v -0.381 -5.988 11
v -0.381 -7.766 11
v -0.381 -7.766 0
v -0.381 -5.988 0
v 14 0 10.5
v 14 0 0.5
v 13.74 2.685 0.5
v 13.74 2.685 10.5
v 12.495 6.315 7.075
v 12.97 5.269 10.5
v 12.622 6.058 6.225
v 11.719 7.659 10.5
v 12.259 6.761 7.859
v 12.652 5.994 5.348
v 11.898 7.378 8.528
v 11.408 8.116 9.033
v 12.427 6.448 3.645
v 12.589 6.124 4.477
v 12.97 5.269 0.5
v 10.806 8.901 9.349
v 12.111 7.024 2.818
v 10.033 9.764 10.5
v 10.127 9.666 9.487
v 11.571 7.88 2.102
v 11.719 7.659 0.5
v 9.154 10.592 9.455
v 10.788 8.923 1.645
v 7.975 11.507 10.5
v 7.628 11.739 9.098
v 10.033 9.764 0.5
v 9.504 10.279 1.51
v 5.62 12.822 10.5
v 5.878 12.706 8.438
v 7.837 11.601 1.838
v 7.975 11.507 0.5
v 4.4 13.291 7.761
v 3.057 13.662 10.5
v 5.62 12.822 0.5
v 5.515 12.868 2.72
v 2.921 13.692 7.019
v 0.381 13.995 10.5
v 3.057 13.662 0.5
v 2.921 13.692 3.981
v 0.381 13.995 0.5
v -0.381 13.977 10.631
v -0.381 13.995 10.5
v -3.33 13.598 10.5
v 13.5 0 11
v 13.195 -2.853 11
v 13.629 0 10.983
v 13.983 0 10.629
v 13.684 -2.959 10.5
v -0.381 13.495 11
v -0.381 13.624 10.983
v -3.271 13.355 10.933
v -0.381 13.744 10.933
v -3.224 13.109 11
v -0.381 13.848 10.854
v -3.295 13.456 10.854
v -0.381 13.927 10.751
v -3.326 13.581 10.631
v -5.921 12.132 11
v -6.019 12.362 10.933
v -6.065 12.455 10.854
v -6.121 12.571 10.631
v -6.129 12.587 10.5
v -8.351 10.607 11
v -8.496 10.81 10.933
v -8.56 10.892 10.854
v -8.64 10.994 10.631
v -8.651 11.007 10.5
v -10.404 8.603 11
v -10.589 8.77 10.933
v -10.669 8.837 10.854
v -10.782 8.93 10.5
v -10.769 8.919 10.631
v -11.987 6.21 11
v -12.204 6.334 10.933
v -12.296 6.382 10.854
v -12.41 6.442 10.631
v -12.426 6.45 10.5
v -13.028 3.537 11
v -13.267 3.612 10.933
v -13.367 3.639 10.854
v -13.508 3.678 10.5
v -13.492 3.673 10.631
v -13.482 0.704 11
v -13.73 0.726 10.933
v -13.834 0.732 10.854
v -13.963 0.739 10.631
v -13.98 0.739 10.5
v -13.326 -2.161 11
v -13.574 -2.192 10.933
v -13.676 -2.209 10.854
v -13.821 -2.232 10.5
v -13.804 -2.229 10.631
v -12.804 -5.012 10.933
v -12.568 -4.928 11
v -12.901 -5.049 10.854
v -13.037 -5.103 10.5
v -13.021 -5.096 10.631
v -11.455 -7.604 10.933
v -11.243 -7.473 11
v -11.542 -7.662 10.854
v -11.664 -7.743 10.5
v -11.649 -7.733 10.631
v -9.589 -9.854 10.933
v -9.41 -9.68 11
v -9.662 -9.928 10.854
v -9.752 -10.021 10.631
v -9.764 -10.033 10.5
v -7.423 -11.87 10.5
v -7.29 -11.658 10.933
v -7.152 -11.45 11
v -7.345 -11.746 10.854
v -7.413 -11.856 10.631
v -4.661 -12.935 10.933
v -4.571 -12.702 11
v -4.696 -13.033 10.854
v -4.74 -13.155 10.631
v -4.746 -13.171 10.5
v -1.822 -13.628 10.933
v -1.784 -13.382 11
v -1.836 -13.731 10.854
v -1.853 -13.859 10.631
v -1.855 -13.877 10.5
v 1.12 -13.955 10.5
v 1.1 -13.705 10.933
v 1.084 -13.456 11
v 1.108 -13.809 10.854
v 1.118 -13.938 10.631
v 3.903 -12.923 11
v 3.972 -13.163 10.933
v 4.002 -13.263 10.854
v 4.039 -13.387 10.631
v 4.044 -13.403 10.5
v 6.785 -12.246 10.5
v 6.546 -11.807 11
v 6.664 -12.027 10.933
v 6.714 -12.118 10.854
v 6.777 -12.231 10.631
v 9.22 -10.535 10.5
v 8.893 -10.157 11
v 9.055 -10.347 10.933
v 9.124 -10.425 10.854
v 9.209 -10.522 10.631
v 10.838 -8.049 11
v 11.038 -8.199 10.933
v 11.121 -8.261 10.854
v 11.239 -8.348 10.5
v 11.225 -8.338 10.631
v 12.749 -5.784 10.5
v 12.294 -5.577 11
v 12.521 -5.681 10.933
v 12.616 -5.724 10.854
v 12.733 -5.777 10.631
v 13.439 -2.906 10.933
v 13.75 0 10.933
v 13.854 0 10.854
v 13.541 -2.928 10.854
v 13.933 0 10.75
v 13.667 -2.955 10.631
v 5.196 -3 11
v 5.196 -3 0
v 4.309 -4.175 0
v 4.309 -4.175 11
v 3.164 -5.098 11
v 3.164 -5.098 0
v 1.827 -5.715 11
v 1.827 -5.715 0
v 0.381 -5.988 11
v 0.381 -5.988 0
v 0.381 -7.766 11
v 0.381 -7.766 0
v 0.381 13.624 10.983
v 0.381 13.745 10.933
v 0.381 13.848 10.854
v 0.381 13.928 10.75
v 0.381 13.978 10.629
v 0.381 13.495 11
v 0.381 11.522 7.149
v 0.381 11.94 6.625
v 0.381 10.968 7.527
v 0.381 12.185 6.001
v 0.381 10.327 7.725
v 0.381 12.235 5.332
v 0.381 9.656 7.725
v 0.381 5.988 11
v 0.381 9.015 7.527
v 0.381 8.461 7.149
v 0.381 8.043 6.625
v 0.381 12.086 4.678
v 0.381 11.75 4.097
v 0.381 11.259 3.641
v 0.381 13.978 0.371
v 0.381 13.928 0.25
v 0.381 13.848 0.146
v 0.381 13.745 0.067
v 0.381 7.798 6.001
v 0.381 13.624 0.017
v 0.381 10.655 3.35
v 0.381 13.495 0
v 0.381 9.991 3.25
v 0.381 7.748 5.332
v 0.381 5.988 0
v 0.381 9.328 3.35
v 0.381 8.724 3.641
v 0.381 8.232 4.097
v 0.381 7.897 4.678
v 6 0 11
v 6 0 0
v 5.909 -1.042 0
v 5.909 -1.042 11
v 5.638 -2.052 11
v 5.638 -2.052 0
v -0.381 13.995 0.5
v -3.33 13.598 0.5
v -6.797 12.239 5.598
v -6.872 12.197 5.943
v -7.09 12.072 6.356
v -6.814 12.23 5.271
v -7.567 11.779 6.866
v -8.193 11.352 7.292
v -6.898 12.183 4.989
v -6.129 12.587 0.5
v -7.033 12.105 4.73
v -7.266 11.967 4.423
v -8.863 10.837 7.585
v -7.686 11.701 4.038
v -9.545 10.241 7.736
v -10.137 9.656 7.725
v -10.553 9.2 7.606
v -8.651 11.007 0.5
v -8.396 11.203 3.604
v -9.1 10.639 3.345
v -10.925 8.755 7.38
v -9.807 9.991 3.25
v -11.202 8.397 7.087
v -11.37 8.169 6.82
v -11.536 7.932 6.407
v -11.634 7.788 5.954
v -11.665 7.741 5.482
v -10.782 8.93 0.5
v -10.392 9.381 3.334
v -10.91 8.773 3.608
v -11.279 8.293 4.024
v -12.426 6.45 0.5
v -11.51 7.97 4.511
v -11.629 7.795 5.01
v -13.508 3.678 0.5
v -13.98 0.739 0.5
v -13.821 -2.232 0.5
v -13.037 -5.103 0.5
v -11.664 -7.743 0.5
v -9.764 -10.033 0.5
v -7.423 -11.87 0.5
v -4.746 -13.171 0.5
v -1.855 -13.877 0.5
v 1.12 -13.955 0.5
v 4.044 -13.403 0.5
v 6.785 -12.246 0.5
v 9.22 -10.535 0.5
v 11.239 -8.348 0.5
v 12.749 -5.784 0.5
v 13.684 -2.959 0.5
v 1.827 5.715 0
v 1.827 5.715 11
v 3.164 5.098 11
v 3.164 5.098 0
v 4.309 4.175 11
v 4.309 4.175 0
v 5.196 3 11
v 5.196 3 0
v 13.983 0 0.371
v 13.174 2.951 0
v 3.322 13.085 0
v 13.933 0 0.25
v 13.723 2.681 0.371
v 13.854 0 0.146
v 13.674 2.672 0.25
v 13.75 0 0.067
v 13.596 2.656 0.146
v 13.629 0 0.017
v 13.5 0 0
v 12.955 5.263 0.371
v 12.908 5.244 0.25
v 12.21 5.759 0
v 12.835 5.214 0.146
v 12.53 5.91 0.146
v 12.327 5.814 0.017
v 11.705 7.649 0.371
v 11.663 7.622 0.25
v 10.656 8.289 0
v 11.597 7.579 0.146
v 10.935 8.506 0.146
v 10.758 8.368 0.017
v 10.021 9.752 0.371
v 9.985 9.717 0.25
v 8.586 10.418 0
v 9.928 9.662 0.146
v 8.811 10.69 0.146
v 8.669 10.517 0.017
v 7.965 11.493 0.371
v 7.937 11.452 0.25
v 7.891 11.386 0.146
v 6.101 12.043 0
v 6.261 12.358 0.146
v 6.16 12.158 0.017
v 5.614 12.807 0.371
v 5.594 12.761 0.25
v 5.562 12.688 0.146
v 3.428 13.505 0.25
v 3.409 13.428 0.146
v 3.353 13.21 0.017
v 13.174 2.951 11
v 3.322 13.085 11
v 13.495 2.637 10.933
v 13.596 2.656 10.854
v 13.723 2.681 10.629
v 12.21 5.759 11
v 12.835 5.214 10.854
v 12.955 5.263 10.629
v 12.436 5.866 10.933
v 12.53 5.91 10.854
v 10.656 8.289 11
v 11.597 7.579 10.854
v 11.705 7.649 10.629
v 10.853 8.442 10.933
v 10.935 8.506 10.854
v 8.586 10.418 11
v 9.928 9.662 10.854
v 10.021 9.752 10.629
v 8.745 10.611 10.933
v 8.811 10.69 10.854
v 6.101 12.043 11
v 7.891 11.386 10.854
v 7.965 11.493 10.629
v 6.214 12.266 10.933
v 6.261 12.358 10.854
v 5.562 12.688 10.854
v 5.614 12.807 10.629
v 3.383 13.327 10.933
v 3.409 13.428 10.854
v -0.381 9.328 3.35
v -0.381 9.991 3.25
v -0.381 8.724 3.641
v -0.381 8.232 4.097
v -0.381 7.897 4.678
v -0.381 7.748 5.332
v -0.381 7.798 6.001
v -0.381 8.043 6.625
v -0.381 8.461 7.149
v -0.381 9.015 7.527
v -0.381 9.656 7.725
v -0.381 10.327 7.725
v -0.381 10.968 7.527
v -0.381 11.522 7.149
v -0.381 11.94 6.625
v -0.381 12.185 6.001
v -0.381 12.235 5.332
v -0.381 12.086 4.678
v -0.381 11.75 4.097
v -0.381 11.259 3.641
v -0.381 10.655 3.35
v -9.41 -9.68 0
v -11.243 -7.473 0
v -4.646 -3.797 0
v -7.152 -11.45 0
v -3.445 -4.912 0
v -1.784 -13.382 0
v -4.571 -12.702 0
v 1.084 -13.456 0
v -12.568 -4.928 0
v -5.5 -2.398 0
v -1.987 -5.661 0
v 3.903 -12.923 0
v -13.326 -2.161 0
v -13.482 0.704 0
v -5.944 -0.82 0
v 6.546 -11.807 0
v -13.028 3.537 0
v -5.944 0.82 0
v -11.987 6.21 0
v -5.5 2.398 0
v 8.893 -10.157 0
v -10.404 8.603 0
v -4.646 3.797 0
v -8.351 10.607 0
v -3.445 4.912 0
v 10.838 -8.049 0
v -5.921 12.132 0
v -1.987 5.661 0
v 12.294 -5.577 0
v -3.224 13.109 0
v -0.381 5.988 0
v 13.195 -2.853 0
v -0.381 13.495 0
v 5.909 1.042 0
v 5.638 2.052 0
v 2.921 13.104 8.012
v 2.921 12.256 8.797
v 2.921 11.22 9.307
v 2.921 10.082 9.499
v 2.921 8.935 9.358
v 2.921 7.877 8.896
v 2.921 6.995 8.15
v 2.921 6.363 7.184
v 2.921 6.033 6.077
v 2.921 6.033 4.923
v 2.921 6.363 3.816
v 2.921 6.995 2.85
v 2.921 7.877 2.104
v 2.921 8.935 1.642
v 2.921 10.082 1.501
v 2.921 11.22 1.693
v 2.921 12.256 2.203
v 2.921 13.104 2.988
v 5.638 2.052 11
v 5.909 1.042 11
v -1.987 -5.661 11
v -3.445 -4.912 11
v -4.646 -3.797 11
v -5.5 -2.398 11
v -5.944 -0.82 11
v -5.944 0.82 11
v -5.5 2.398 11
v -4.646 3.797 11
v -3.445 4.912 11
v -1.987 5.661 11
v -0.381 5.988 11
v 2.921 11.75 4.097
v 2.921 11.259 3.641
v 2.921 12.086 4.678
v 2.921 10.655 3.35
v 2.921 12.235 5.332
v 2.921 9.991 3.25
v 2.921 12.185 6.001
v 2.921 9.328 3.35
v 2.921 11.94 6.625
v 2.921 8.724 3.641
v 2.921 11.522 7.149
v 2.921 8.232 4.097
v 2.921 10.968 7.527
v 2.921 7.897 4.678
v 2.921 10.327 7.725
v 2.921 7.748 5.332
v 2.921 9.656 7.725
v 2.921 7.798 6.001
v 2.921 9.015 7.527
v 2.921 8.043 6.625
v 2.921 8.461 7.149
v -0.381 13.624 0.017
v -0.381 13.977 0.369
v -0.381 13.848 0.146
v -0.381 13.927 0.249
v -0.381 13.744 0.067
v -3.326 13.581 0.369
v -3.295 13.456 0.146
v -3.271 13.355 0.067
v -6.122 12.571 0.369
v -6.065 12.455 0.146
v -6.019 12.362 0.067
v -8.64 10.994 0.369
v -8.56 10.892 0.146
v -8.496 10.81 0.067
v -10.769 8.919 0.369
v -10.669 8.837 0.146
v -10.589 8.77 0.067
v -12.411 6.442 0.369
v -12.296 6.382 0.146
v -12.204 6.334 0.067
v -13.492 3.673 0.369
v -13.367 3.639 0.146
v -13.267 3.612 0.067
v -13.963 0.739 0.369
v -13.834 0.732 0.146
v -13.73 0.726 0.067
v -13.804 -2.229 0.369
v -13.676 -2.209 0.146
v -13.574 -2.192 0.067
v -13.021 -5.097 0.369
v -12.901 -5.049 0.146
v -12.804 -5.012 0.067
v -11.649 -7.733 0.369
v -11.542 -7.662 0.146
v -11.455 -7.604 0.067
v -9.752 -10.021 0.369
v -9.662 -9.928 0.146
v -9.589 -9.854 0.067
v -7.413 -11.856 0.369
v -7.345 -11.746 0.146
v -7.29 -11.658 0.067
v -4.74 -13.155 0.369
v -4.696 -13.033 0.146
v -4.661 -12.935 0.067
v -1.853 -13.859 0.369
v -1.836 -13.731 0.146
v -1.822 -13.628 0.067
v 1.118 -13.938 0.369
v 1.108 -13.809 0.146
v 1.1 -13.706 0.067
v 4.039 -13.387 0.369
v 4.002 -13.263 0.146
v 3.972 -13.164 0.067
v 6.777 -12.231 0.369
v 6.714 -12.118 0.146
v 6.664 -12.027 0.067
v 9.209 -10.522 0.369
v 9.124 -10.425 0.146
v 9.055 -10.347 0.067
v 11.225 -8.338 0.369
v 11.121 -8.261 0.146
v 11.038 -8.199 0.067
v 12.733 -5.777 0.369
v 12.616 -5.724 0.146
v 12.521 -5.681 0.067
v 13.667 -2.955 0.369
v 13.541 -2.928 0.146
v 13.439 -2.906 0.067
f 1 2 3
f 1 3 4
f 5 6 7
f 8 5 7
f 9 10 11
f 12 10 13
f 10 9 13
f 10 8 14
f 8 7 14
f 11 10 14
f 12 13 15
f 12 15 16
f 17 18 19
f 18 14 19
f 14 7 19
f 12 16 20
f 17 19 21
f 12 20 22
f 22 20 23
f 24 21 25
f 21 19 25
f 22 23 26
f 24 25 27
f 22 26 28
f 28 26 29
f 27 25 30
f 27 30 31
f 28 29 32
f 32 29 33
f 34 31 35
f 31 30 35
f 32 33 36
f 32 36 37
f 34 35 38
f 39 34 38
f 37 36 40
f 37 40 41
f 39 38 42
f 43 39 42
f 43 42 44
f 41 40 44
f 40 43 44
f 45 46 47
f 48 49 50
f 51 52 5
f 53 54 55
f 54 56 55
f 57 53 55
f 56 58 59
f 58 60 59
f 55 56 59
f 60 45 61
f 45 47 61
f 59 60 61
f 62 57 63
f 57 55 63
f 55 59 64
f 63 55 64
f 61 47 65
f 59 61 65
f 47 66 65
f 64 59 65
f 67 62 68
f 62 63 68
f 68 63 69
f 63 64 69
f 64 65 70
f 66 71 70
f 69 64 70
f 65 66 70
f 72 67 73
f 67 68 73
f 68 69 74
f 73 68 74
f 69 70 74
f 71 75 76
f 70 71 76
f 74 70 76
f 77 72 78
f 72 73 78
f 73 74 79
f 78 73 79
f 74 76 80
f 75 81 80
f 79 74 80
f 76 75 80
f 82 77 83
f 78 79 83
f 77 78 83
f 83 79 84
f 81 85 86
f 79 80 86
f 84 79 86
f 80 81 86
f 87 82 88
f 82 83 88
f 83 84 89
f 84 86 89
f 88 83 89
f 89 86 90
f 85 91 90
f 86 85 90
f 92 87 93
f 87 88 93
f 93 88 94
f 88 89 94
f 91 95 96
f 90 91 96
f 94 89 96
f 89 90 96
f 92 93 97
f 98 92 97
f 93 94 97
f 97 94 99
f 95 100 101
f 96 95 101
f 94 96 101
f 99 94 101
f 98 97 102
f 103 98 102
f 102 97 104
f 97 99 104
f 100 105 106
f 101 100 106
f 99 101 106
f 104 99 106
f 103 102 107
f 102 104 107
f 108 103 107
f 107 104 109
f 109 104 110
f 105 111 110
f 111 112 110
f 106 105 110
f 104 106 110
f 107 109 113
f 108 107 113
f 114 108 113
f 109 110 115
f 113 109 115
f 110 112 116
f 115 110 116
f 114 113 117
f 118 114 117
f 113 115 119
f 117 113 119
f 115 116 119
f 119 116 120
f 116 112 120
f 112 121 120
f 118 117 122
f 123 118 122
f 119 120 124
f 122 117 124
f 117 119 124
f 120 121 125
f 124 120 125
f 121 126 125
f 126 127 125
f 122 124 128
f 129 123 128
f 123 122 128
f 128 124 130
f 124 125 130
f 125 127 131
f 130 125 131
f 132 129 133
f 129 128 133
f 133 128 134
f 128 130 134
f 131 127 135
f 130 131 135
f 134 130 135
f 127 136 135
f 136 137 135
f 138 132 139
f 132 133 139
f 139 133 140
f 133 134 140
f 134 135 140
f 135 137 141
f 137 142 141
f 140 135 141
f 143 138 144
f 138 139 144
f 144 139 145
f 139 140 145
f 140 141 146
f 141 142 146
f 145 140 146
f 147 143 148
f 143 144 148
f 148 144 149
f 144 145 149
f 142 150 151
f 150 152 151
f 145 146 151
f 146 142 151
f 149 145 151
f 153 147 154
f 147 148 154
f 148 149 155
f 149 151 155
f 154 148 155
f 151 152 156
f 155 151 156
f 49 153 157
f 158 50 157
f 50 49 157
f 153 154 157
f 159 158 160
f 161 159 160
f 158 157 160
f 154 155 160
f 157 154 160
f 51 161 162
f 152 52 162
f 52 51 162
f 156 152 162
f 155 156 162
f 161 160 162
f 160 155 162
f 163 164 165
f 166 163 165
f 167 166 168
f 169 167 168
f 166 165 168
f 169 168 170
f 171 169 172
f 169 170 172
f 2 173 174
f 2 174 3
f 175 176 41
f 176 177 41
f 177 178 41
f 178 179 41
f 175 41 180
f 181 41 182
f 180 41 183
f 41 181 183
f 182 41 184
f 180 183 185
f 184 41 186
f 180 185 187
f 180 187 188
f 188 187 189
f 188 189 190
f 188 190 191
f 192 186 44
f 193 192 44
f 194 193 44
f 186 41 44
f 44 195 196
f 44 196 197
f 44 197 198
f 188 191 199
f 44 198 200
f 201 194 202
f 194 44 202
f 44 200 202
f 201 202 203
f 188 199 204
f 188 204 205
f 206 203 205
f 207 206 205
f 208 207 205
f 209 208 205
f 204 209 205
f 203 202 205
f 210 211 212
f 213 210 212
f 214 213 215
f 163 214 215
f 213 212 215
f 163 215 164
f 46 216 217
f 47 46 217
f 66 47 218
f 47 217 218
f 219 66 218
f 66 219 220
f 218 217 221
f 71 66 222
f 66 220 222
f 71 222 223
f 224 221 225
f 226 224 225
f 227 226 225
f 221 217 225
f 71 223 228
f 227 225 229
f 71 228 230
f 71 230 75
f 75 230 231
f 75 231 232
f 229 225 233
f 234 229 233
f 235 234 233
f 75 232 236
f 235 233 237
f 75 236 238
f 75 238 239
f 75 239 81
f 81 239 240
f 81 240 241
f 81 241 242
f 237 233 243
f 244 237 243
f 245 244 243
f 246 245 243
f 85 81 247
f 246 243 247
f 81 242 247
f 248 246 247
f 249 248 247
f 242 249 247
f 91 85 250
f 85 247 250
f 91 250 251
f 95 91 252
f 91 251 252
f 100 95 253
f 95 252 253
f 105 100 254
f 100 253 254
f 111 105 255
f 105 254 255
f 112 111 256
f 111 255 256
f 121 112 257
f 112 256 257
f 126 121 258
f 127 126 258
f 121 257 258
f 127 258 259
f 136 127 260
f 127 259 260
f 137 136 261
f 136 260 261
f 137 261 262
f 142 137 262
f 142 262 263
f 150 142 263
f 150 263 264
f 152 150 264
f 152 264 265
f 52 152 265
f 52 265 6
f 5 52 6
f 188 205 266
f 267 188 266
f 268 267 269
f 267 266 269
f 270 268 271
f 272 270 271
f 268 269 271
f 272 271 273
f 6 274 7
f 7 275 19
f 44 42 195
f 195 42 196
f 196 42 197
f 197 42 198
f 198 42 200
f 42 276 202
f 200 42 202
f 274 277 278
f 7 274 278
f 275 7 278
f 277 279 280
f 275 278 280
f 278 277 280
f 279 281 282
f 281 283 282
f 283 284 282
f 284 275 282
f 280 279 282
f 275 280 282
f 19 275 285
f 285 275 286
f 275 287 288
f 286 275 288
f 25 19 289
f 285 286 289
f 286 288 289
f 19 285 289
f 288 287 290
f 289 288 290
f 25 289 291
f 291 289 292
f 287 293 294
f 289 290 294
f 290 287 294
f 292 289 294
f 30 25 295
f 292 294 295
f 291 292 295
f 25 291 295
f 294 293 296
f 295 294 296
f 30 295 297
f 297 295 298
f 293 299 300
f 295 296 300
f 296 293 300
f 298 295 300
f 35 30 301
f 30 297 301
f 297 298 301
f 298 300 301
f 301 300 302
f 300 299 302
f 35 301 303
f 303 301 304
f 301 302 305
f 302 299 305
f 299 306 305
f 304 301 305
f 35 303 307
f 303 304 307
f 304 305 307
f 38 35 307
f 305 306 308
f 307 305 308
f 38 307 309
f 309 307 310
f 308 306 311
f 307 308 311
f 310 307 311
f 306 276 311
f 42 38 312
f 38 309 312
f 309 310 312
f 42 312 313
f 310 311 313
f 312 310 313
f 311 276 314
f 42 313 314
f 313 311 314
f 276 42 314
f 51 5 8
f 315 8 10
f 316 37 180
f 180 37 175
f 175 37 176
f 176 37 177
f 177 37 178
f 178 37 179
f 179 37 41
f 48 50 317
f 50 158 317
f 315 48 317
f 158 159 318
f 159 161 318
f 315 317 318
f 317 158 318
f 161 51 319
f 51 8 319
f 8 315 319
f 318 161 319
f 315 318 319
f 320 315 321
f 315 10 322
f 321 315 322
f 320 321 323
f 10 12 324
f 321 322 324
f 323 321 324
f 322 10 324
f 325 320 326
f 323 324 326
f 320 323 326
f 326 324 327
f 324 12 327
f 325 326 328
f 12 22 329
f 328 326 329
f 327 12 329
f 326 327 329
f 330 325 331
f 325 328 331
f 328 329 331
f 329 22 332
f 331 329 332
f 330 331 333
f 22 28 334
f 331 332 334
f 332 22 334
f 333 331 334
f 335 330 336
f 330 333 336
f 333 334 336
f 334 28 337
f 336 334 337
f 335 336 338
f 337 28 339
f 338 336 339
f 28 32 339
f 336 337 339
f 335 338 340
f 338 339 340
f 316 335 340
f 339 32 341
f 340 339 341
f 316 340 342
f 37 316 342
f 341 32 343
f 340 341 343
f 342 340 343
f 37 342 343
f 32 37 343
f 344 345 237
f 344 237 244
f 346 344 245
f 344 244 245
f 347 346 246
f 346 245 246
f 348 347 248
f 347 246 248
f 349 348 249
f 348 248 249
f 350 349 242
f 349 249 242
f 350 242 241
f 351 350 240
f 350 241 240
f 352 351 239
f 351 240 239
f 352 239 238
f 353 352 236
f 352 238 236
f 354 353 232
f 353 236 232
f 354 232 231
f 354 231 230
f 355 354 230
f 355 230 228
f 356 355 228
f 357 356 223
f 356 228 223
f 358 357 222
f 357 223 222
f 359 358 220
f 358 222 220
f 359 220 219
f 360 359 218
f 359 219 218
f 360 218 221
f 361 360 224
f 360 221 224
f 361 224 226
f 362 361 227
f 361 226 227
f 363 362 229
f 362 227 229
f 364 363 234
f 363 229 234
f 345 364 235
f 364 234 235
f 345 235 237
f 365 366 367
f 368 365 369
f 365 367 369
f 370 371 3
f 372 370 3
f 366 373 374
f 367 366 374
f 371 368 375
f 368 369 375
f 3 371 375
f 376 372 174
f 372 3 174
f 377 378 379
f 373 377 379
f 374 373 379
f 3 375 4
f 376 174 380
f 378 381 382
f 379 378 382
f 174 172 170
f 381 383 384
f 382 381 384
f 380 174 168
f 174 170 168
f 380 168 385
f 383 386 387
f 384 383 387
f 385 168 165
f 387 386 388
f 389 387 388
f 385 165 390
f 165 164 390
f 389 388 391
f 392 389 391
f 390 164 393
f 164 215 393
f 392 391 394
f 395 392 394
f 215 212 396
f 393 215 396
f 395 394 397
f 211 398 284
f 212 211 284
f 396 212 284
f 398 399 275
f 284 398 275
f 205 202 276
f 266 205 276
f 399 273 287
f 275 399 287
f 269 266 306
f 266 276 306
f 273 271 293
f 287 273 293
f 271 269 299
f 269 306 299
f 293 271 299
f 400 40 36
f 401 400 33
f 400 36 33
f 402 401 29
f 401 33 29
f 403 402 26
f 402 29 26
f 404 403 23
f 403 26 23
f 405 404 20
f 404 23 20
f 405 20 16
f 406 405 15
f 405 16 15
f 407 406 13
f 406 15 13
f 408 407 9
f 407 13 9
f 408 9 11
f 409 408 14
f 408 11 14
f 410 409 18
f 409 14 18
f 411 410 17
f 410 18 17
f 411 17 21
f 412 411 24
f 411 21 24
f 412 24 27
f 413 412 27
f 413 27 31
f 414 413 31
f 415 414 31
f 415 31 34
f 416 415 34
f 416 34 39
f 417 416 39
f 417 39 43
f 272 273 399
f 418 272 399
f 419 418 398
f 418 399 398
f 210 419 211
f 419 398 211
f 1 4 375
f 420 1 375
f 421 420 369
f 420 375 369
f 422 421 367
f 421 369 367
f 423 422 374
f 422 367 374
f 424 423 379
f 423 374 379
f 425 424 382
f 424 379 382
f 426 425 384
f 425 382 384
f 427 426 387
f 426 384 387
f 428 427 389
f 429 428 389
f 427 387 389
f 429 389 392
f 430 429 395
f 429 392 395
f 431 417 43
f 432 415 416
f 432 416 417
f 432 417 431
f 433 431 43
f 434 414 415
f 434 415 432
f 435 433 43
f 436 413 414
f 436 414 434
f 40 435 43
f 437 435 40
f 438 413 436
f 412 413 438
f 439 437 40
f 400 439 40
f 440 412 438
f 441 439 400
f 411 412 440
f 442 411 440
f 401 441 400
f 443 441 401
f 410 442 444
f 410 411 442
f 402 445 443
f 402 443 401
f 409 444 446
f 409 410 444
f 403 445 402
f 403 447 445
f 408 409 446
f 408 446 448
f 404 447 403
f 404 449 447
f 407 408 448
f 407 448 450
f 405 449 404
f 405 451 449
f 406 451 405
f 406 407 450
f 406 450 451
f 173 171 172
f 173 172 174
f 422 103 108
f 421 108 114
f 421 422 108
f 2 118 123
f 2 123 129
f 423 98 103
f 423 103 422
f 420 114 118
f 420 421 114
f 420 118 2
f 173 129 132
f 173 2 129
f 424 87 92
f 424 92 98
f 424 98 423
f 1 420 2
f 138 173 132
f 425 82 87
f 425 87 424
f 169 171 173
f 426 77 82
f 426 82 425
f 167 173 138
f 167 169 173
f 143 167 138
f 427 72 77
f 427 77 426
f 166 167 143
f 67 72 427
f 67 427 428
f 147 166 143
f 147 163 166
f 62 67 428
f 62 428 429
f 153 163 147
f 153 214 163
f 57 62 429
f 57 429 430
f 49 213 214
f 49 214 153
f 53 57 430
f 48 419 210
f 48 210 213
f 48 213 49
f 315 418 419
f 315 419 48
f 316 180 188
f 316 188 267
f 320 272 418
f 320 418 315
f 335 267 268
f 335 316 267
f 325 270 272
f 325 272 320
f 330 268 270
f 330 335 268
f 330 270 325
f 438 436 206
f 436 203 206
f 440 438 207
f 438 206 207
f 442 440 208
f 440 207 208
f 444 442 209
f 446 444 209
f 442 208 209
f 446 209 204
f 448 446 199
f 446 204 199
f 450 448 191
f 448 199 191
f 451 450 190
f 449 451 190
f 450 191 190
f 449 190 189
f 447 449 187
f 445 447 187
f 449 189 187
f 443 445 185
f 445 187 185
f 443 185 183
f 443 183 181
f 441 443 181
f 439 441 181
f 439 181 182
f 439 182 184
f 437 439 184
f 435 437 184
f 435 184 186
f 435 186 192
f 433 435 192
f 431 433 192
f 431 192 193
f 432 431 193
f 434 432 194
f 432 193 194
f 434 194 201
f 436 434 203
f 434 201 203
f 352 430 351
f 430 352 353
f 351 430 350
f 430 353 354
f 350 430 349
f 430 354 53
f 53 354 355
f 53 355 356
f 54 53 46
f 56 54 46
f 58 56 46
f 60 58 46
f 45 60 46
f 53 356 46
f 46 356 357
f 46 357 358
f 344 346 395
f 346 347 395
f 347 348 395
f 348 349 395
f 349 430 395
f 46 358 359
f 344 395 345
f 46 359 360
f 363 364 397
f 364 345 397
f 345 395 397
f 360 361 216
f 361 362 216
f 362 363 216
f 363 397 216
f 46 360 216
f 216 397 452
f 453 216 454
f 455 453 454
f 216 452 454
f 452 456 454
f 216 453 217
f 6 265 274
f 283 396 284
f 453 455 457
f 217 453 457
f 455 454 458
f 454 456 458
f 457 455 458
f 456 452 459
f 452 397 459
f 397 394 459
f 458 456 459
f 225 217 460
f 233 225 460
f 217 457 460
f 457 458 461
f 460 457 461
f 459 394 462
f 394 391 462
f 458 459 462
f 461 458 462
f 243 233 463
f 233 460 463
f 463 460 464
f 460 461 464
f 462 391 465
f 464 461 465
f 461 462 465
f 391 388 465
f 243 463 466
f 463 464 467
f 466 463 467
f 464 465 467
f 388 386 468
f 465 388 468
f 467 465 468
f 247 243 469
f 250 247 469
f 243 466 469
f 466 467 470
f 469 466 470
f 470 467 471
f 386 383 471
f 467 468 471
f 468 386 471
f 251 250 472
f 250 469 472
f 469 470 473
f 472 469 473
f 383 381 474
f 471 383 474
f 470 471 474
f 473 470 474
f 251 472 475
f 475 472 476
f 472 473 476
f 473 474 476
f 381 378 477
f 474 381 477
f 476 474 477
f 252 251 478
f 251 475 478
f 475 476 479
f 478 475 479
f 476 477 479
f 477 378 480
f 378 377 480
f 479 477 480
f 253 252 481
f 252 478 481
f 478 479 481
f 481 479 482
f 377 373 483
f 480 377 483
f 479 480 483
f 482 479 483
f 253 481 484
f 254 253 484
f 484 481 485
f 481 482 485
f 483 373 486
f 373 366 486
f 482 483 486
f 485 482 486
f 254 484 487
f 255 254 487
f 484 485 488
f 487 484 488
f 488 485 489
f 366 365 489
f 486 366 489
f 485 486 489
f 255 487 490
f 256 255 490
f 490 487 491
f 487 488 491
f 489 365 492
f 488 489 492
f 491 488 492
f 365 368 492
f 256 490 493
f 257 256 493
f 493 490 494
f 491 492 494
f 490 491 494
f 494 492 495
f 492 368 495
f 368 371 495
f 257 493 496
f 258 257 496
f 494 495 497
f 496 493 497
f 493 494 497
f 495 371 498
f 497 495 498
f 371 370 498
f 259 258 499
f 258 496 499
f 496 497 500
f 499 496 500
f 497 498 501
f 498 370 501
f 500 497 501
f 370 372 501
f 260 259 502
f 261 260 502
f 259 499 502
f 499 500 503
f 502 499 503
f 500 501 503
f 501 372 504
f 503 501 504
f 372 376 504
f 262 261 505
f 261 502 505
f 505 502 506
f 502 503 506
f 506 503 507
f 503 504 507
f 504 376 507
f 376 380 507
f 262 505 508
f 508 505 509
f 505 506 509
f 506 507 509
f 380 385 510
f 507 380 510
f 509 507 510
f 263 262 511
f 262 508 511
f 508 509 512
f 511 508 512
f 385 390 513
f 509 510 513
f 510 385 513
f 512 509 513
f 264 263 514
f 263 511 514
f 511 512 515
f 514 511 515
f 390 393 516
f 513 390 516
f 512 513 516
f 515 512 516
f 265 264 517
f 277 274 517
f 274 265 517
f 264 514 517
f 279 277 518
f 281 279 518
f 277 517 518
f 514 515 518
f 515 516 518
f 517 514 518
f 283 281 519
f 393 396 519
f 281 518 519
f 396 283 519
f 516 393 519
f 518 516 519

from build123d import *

# Parameters (mm, degrees)
BOSS_EXTRUDE1_DEPTH            = 11
CBORE_FOR_M4_SHCS2_D           = 4.5
CBORE_FOR_M4_SHCS2_CBORE_D     = 8
CBORE_FOR_M4_SHCS2_CBORE_DEPTH = 11.079
FILLET1_R                      = 0.5


with BuildPart() as part:
    # Sketch1 → Boss-Extrude1 (new body)
    with BuildSketch(Plane.XY):
        with BuildLine():
            ThreePointArc((0.381, 5.987891031), (3.163547137, 5.098231998), (5.196152423, 3))
            ThreePointArc((5.196152423, 3), (5.795554958, 1.552914271), (6, 0))
            ThreePointArc((6, 0), (5.795554958, -1.552914271), (5.196152423, -3))
            ThreePointArc((5.196152423, -3), (3.163547137, -5.098231998), (0.381, -5.987891031))
            Line((0.381, -5.987891031), (0.381, -7.765891031))
            Line((0.381, -7.765891031), (-0.381, -7.765891031))
            Line((-0.381, -7.765891031), (-0.381, -5.987891031))
            ThreePointArc((-0.381, -5.987891031), (-6, 0), (-0.381, 5.987891031))
            Line((-0.381, 5.987891031), (-0.381, 13.994814718))
            ThreePointArc((-0.381, 13.994814718), (-9.763861941, -10.033294574), (14, 0))
            ThreePointArc((14, 0), (10.033294574, 9.763861941), (0.381, 13.994814718))
            Line((0.381, 13.994814718), (0.381, 5.987891031))
        make_face()
    extrude(amount=BOSS_EXTRUDE1_DEPTH)

    # CBORE for M4 SHCS2 (through all)
    with Locations(Plane(origin=(14, 0, 0), x_dir=(0, 0, 1), z_dir=(1, 0, 0))):
        with Locations((5.5, -9.991352875)):
            CounterBoreHole(CBORE_FOR_M4_SHCS2_D / 2, CBORE_FOR_M4_SHCS2_CBORE_D / 2, CBORE_FOR_M4_SHCS2_CBORE_DEPTH)

    # Fillet1
    fillet1_edges = [part.edges().sort_by_distance(p)[0] for p in [
        (-9.763861941, -10.033294574, 11),
        (-9.763861941, -10.033294574, 0),
    ]]
    fillet(fillet1_edges, radius=FILLET1_R)


solid = part.part
